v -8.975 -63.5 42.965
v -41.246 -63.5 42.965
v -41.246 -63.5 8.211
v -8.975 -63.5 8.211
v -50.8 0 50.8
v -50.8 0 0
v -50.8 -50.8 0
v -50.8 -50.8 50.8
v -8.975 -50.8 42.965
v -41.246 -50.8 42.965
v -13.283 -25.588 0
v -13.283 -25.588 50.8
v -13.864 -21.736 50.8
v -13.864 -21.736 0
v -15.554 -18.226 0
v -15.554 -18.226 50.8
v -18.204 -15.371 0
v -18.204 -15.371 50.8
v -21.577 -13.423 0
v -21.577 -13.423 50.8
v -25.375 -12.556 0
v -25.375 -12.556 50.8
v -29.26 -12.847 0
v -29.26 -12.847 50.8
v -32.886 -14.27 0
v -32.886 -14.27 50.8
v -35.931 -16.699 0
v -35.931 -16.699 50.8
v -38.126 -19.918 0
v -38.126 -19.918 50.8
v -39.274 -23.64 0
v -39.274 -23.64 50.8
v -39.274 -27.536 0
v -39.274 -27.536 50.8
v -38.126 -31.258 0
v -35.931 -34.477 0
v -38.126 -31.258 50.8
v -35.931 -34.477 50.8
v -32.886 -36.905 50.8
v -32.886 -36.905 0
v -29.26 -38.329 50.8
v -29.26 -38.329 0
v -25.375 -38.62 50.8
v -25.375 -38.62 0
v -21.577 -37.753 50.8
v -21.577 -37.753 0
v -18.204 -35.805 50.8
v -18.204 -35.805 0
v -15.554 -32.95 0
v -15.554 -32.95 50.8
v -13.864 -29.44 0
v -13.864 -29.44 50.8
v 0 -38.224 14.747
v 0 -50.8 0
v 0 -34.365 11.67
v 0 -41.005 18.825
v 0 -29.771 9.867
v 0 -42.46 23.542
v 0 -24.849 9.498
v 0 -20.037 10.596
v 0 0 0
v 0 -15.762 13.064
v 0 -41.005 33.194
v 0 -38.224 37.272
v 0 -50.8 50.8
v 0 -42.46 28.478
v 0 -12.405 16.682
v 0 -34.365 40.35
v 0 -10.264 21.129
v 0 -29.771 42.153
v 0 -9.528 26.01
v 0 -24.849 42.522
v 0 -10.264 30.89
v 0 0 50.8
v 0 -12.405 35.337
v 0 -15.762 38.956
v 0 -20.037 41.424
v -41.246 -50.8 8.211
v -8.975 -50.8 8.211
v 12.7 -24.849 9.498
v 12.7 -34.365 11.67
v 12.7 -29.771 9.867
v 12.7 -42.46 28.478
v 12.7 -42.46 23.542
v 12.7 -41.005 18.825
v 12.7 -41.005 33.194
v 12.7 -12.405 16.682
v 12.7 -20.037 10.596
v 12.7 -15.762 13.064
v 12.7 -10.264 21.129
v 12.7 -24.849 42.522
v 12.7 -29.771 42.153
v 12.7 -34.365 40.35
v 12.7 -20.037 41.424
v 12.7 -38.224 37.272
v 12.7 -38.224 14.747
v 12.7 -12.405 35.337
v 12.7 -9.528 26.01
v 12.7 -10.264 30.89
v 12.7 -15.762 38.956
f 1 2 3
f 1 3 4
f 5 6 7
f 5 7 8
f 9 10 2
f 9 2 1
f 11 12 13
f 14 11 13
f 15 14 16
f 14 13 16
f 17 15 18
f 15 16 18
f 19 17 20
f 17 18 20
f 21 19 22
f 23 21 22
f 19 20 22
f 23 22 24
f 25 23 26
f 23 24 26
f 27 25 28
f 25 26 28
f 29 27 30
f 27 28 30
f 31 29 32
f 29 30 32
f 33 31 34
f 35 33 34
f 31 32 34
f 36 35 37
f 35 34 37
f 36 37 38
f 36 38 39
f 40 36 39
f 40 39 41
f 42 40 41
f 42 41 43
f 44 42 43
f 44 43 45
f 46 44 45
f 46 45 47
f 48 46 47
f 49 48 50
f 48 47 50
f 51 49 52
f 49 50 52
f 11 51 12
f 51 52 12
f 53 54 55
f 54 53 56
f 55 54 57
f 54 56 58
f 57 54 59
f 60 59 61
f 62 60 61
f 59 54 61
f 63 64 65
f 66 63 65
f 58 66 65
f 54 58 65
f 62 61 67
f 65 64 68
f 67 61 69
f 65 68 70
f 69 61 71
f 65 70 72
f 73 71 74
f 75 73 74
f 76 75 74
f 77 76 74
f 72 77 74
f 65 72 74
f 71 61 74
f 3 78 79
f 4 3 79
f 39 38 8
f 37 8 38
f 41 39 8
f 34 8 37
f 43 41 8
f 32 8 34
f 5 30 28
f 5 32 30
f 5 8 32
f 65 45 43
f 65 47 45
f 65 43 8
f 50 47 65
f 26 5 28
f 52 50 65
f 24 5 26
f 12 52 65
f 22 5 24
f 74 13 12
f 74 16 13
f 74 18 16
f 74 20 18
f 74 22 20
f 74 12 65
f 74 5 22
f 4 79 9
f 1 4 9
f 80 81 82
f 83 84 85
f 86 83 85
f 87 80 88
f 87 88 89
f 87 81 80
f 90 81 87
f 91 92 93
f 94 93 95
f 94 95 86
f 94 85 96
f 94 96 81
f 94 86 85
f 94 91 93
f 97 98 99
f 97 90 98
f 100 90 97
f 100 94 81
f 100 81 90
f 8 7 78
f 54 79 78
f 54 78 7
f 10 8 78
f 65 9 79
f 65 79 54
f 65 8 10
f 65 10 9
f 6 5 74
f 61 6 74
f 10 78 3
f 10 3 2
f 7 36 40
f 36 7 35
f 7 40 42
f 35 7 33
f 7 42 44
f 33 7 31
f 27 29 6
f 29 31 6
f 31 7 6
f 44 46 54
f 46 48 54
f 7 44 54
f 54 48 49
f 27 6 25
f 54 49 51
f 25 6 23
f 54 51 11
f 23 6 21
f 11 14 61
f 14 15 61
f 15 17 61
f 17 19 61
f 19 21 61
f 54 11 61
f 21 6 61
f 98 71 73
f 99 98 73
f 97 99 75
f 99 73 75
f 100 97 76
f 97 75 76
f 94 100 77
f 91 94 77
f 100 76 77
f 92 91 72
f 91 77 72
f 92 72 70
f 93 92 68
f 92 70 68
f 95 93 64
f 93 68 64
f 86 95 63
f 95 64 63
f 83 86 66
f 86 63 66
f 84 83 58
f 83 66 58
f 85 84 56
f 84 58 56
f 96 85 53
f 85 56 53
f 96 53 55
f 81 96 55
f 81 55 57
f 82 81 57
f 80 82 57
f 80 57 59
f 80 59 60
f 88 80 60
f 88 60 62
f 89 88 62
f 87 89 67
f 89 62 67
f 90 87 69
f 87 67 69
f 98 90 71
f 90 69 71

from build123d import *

# Parameters (mm, degrees)
F0_W     = 50.8
F0_H     = 50.8
F1_DEPTH = 50.8
F2_R     = 13.0683
F3_DEPTH = 50.8
F4_R     = 16.558312
F5_DEPTH = 12.7
F6_W     = 32.271338
F6_H     = 34.753747
F7_DEPTH = 12.7


with BuildPart() as f1:
    # F0 (on Front) → F1 (new body)
    with BuildSketch(Plane.XZ):
        with Locations((-25.4, 25.4)):
            Rectangle(F0_W, F0_H)
    extrude(amount=F1_DEPTH)

    # F2 (on face) → F3 (cut)
    with BuildSketch(Plane.XY.offset(50.8)):
        with Locations((-26.351742, -25.587924)):
            Circle(F2_R)
    extrude(amount=-F3_DEPTH, mode=Mode.SUBTRACT)

    # F4 (on face) → F5 (join)
    with BuildSketch(Plane.YZ):
        with Locations((-26.086254, 26.009806)):
            Circle(F4_R)
    extrude(amount=F5_DEPTH)

    # F6 (on face) → F7 (join)
    with BuildSketch(Plane.XZ.offset(50.8)):
        with Locations((-25.110537, 25.587923)):
            Rectangle(F6_W, F6_H)
    extrude(amount=F7_DEPTH)


solid = f1.part
